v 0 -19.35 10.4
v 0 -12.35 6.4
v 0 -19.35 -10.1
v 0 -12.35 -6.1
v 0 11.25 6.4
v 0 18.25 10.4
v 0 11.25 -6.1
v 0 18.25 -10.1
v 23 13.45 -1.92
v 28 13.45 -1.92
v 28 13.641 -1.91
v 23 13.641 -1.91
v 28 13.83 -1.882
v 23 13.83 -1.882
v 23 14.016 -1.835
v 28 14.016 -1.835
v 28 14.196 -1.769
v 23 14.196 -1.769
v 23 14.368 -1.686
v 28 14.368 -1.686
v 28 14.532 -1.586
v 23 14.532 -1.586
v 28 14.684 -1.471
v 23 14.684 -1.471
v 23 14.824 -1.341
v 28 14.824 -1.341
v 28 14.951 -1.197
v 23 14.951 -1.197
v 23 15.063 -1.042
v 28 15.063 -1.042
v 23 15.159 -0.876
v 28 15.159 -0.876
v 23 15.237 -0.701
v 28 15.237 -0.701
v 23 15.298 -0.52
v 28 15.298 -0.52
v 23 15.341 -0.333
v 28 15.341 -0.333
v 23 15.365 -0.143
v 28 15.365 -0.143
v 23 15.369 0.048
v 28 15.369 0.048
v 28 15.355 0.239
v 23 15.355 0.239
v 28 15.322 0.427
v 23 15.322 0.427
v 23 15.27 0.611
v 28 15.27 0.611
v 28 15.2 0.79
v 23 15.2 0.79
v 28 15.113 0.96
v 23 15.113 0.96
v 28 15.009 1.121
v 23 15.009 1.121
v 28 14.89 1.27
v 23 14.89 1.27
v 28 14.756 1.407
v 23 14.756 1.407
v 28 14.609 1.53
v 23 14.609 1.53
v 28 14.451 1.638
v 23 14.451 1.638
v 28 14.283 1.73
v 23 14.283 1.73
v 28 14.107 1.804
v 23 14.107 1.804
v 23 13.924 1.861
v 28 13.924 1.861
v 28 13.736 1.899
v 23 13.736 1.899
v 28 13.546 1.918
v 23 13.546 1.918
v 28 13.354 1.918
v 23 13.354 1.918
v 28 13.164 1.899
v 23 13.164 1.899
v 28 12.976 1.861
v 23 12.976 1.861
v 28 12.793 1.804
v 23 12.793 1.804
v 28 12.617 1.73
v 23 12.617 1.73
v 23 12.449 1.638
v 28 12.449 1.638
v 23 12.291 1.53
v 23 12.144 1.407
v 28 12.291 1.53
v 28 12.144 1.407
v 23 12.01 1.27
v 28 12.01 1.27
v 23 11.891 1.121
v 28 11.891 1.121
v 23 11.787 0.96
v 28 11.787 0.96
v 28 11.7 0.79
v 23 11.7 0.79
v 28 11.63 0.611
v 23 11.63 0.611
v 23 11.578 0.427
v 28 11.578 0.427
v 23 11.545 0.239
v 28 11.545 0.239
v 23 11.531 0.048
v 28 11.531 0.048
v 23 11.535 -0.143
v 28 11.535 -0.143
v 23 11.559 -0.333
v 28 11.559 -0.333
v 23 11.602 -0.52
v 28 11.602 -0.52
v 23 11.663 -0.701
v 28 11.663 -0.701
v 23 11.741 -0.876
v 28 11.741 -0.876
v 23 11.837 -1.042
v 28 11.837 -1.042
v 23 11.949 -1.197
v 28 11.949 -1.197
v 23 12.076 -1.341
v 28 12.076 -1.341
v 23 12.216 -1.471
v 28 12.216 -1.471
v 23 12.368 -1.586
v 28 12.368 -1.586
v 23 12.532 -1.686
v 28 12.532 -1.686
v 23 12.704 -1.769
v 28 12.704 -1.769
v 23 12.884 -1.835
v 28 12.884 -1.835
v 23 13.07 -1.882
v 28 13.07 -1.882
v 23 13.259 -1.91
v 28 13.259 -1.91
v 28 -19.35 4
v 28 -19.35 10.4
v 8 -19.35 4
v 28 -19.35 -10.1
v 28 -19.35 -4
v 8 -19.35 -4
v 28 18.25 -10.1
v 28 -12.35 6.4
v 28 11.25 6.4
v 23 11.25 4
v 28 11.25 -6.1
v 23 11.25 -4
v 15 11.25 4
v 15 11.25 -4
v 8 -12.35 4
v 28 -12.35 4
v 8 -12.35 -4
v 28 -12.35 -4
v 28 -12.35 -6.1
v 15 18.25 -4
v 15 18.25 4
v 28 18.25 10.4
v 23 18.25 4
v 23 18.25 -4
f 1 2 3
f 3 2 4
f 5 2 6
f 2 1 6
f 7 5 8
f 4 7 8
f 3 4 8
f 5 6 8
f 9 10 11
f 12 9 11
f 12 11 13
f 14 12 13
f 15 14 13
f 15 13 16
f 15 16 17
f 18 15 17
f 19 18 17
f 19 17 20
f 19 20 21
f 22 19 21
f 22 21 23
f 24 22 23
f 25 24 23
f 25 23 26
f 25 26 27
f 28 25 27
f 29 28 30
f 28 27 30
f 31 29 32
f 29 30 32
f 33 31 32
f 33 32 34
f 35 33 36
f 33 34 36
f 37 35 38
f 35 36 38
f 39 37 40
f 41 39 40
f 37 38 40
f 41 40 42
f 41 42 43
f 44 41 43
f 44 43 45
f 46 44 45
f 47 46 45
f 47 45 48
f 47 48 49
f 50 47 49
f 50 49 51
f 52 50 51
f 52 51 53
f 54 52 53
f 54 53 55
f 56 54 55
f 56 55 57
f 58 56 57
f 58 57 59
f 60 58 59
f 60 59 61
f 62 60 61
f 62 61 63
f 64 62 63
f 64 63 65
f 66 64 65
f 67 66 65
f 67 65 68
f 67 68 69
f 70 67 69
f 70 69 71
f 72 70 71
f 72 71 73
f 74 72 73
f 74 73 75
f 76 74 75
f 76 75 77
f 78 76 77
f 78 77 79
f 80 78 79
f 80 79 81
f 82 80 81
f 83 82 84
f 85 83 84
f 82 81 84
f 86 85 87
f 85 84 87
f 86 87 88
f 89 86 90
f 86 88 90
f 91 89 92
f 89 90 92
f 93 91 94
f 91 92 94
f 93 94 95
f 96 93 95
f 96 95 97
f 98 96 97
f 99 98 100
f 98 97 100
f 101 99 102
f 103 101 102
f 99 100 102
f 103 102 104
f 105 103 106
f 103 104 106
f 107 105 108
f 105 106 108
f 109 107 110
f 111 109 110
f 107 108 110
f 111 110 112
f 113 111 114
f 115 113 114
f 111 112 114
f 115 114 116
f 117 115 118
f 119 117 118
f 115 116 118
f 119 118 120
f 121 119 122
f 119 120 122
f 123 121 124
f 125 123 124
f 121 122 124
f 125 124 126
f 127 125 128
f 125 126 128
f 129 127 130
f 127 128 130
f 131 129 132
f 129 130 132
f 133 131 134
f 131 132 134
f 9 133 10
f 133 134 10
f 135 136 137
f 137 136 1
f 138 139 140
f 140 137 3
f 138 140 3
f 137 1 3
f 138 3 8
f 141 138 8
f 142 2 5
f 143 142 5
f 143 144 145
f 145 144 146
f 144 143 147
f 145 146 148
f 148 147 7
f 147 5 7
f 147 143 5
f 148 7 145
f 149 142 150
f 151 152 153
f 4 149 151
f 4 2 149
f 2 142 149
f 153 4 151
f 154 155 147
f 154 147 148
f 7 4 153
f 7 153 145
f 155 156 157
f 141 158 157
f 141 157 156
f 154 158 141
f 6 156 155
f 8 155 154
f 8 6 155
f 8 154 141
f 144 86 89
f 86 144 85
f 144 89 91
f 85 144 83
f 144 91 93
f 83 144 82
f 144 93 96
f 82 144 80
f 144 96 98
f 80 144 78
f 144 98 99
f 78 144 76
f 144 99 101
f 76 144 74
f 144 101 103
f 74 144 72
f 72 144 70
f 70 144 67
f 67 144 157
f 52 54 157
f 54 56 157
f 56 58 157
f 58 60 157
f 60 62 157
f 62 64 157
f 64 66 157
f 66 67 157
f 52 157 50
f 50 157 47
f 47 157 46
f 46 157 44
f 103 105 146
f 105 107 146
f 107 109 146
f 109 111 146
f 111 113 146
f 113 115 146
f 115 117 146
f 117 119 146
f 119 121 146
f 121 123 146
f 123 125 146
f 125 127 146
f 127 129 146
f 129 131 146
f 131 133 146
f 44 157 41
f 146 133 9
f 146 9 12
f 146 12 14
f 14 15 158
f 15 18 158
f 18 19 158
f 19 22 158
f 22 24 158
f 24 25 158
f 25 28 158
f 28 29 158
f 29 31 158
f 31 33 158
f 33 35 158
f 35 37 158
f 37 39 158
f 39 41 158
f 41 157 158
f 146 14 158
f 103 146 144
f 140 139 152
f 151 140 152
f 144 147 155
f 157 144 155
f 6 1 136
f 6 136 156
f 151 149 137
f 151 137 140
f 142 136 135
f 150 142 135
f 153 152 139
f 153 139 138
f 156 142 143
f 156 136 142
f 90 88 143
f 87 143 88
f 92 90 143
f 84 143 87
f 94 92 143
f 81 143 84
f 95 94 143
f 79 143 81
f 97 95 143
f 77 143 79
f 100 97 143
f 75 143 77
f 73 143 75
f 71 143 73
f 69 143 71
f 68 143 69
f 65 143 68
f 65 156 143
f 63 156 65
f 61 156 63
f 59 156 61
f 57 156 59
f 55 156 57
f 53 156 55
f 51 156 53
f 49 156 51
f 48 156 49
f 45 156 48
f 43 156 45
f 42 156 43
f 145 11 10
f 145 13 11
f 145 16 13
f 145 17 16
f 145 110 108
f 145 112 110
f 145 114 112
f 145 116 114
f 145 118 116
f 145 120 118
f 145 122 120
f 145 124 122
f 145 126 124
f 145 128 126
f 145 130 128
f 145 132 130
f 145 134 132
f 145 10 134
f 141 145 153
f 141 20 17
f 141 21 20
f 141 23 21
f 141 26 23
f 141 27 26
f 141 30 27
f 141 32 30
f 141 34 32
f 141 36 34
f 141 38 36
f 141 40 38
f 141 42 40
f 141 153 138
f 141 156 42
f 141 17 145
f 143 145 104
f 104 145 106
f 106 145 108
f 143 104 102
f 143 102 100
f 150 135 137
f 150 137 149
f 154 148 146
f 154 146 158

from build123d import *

# Parameters (mm, degrees)
SKETCH1_W           = 20.5
SKETCH1_H           = 37.6
SKETCH1_W_2         = 12.5
SKETCH1_H_2         = 23.6
BOSS_EXTRUDE1_DEPTH = 28
SKETCH2_R           = 1.92
CUT_EXTRUDE1_DEPTH  = 13
SKETCH3_W           = 8
SKETCH3_H           = 7
CUT_EXTRUDE2_DEPTH  = 8
SKETCH4_W           = 8
SKETCH4_H           = 7
CUT_EXTRUDE3_DEPTH  = 20


with BuildPart() as part:
    # Sketch1 → Boss-Extrude1 (new body)
    with BuildSketch(Plane(origin=(0, 0, 0), x_dir=(0, 0, -1), z_dir=(1, 0, 0))):
        with Locations((-0.15, -0.55)):
            Rectangle(SKETCH1_W, SKETCH1_H)
        with Locations((-0.15, -0.55)):
            Rectangle(SKETCH1_W_2, SKETCH1_H_2, mode=Mode.SUBTRACT)
    extrude(amount=BOSS_EXTRUDE1_DEPTH)

    # Sketch2 → Cut-Extrude1 (cut)
    with BuildSketch(Plane(origin=(28, 0, 0), x_dir=(0, 0, -1), z_dir=(1, 0, 0))):
        with Locations((0, 13.45)):
            Circle(SKETCH2_R)
    extrude(amount=-CUT_EXTRUDE1_DEPTH, mode=Mode.SUBTRACT)

    # Sketch3 → Cut-Extrude2 (cut)
    with BuildSketch(Plane(origin=(15, 0, 0), x_dir=(0, 0, -1), z_dir=(1, 0, 0))):
        with Locations((0, 14.75)):
            Rectangle(SKETCH3_W, SKETCH3_H)
    extrude(amount=CUT_EXTRUDE2_DEPTH, mode=Mode.SUBTRACT)

    # Sketch4 → Cut-Extrude3 (cut)
    with BuildSketch(Plane(origin=(28, 0, 0), x_dir=(0, 0, -1), z_dir=(1, 0, 0))):
        with Locations((0, -15.85)):
            Rectangle(SKETCH4_W, SKETCH4_H)
    extrude(amount=-CUT_EXTRUDE3_DEPTH, mode=Mode.SUBTRACT)


solid = part.part
